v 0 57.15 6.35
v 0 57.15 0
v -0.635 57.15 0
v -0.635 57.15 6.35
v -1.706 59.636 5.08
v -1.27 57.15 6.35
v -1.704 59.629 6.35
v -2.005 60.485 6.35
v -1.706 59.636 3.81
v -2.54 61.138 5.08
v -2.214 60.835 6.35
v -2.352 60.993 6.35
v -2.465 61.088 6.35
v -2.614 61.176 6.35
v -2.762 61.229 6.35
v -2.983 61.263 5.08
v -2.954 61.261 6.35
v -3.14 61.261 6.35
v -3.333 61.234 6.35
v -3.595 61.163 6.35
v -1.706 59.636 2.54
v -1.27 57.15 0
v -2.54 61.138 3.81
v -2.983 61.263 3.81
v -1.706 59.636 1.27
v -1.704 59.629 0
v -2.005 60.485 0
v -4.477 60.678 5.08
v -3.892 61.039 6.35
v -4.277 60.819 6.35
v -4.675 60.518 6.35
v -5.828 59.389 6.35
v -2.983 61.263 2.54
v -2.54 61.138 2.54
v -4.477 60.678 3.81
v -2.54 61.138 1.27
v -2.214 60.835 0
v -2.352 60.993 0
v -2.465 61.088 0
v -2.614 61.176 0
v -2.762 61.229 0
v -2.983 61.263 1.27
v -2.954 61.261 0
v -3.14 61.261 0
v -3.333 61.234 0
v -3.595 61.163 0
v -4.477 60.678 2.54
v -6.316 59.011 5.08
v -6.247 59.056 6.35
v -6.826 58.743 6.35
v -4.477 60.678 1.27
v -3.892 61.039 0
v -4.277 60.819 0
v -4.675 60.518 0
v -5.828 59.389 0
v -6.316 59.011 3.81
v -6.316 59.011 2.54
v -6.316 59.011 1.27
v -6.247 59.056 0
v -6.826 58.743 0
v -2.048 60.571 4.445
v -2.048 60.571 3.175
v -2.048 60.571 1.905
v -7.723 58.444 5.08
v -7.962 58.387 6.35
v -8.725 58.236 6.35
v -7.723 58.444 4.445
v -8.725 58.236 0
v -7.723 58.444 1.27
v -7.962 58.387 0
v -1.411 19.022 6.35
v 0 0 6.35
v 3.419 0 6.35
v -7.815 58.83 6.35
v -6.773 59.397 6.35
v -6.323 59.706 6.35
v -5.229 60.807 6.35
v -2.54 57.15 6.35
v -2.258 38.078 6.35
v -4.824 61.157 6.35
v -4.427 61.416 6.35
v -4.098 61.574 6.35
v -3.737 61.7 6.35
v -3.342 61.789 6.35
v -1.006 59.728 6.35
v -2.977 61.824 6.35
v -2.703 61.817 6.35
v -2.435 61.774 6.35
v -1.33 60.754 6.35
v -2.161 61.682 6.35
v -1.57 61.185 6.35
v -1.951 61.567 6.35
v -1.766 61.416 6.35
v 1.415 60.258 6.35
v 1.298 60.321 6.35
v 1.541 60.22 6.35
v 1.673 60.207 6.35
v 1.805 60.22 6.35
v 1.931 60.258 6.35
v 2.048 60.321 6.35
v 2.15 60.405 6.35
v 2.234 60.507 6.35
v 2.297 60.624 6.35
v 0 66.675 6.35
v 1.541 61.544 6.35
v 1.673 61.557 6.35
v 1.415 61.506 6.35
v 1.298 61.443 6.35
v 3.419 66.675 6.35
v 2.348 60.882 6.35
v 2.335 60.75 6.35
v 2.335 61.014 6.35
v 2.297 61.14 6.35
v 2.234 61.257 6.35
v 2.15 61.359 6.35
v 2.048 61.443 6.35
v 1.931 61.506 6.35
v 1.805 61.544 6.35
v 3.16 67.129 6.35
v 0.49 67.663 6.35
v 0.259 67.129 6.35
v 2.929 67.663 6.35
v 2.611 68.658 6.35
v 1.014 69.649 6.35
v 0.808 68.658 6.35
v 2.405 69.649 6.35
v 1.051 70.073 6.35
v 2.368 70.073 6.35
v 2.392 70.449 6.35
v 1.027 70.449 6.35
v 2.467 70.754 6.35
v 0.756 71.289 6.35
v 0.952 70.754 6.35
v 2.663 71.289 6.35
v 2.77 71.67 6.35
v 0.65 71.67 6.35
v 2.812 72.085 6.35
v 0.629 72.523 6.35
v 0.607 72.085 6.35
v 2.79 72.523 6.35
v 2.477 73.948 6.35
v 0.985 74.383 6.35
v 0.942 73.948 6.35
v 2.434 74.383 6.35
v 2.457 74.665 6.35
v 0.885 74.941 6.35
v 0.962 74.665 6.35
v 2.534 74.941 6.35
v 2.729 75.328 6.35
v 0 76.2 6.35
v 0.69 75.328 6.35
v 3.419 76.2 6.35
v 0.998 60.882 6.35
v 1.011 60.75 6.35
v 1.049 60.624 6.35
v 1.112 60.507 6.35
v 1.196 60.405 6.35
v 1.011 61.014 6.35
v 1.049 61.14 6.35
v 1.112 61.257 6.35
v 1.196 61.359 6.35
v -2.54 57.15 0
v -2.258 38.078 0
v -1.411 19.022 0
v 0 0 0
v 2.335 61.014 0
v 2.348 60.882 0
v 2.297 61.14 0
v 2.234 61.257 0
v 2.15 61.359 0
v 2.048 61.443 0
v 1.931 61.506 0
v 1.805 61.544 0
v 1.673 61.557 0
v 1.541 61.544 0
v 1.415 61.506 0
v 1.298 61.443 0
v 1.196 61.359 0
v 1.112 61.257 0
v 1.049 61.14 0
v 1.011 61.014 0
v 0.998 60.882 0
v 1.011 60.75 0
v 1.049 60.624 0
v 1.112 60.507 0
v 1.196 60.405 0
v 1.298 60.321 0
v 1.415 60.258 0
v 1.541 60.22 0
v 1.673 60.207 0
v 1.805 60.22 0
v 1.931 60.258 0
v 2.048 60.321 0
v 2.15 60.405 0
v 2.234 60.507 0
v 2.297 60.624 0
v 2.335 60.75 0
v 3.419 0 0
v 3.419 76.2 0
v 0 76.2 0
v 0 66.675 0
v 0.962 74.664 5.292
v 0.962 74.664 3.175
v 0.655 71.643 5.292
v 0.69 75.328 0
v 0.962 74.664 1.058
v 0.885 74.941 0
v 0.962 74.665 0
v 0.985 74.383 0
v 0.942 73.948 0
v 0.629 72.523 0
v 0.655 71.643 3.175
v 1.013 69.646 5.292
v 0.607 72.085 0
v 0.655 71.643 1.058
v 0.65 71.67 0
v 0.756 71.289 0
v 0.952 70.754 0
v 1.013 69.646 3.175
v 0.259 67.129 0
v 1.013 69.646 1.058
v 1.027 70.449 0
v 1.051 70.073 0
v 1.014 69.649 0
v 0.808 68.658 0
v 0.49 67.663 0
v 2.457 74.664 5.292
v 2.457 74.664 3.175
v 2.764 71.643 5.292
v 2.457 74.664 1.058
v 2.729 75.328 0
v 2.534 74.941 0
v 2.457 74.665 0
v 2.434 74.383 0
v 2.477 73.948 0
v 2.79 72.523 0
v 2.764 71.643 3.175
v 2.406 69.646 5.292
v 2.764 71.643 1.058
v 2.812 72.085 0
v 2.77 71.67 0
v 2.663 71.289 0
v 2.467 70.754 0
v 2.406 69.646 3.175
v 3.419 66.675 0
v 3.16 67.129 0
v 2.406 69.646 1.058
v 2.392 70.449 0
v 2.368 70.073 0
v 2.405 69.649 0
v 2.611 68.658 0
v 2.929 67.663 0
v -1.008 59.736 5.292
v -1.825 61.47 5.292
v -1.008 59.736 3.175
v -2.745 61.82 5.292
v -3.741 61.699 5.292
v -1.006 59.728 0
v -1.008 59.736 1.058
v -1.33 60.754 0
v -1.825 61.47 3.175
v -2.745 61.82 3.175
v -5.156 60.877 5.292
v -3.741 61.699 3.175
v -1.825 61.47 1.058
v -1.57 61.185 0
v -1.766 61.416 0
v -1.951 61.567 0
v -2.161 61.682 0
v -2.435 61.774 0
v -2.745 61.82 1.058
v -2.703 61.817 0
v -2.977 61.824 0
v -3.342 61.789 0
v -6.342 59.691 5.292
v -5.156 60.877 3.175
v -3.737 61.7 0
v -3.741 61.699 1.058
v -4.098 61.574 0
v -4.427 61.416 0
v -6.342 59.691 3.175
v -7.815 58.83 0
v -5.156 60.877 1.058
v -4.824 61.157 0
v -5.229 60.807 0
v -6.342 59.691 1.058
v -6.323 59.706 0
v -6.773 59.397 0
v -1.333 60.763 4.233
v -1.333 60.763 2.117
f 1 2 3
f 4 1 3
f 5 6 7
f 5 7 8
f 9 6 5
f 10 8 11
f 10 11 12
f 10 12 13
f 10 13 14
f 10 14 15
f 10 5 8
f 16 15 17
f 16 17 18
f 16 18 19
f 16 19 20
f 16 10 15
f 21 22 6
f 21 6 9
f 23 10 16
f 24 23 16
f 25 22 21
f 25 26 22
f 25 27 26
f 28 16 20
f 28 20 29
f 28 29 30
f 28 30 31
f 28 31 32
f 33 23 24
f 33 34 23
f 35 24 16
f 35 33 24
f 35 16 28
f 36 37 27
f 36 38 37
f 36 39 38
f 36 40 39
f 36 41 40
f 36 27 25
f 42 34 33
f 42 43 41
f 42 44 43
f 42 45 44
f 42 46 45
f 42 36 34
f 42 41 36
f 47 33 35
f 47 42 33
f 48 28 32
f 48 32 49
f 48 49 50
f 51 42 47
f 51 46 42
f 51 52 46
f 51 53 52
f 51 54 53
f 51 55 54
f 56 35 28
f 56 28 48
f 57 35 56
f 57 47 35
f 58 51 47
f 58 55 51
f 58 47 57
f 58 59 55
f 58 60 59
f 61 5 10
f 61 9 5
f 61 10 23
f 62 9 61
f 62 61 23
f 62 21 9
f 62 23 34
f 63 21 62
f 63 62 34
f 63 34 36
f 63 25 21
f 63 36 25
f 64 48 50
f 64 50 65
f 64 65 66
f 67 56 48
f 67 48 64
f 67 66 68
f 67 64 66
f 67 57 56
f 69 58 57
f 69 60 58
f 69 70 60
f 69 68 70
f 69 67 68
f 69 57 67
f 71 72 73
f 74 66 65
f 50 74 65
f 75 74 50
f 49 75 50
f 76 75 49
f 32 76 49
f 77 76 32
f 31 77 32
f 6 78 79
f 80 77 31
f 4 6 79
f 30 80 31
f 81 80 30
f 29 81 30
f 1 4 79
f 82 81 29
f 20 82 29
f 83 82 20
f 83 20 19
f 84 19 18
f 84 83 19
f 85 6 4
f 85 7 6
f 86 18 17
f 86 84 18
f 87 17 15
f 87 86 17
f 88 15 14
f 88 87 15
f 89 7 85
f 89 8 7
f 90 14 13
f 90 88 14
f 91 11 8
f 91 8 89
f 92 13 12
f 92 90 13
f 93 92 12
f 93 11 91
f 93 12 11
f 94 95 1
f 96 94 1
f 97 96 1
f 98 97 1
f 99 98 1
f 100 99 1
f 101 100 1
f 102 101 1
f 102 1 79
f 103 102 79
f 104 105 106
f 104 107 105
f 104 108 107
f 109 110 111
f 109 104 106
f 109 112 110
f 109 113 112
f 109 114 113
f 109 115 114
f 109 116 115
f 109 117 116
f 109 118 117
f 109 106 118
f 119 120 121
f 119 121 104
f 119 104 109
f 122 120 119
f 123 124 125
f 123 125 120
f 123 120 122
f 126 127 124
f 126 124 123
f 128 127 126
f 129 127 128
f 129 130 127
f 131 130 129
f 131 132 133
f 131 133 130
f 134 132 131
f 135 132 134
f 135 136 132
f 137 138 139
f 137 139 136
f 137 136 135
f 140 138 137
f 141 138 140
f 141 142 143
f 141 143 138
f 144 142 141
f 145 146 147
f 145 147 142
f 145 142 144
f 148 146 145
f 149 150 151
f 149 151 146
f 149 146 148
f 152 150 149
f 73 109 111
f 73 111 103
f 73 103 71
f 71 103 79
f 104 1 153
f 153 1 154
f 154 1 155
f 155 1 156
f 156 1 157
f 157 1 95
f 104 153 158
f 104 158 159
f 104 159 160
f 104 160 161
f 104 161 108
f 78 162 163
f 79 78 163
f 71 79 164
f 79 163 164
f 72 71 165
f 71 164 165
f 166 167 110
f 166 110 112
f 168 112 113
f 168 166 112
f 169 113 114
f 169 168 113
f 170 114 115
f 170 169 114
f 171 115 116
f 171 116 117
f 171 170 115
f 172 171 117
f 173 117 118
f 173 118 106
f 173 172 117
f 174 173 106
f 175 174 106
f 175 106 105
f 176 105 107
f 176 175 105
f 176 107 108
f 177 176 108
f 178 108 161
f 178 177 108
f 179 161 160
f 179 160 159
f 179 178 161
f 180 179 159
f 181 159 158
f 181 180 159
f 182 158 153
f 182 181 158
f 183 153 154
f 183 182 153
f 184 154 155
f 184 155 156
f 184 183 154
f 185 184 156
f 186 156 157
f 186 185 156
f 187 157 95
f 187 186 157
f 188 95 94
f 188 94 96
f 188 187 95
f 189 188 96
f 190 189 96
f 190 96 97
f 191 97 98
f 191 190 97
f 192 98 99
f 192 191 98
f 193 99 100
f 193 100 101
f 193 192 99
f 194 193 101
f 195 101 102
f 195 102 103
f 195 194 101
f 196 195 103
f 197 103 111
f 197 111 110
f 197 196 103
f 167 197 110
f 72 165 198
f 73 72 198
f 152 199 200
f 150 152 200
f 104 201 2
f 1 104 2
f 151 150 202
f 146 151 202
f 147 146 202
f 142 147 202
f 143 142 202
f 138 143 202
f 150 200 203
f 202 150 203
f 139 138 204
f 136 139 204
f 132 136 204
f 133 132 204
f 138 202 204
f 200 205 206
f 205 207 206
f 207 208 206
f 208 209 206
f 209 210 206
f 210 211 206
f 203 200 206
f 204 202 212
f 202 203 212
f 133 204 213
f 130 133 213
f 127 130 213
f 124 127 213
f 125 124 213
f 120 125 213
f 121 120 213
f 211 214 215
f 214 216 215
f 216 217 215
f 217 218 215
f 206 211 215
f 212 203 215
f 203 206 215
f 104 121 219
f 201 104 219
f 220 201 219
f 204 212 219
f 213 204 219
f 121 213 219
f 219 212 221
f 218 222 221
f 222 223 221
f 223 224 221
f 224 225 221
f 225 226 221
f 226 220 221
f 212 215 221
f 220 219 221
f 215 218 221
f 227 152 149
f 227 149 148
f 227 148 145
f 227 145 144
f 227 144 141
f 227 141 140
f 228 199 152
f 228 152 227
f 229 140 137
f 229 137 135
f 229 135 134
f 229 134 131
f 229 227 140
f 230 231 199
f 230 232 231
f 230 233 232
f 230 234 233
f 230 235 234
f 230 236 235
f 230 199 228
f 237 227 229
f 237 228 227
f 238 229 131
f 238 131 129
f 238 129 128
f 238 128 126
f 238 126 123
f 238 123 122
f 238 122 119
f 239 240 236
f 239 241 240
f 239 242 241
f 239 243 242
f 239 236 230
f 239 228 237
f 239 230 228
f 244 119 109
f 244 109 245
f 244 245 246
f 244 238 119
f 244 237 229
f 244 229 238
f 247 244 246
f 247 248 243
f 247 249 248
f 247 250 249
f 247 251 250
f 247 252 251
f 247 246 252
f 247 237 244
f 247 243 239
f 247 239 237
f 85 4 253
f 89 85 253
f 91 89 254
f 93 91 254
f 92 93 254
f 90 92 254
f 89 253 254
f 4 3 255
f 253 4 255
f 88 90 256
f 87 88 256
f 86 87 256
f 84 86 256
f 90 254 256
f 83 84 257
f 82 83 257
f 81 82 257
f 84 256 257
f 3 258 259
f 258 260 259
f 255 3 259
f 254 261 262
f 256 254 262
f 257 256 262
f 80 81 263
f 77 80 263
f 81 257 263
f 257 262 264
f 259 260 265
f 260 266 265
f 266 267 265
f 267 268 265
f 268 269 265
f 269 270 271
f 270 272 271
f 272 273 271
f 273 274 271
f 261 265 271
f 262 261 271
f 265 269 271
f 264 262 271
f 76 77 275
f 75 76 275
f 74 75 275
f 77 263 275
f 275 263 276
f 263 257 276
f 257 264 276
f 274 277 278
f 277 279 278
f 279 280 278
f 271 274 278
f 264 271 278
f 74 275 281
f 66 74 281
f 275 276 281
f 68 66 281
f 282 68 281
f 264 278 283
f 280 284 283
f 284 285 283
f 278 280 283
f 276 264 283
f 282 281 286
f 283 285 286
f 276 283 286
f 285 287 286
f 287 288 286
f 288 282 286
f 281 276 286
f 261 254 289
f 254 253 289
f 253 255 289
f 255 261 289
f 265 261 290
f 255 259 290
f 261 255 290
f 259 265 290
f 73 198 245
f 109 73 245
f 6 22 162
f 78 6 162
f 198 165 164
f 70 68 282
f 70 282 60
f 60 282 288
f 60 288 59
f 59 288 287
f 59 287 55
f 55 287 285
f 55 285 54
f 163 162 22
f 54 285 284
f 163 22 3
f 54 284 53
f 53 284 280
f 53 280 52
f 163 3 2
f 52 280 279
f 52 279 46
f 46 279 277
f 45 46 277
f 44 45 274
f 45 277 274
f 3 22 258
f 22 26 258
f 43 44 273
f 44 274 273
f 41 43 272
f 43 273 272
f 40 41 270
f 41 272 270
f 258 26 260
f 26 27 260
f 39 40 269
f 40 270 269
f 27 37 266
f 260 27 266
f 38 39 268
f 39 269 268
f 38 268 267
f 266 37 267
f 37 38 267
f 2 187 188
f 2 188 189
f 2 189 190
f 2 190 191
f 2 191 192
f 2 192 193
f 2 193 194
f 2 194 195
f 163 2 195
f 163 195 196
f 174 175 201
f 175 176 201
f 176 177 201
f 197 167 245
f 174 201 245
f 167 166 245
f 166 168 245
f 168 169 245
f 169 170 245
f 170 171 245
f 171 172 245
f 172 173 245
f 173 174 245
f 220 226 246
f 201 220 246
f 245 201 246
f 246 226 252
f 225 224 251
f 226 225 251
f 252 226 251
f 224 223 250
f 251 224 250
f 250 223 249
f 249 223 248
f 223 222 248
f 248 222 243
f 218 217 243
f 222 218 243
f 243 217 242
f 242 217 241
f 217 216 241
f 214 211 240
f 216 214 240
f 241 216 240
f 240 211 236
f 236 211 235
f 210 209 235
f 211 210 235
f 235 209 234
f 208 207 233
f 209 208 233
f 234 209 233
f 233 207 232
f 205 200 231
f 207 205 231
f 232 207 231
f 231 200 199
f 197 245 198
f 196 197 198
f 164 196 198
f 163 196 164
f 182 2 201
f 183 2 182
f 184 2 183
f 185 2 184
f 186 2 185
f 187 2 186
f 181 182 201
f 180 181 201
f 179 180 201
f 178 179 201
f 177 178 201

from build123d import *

# Parameters (mm, degrees)
F0_R     = 0.6750562138
F1_DEPTH = 6.35


with BuildPart() as f1:
    # F0 (on Top) → F1 (new body)
    with BuildSketch(Plane.XY):
        with BuildLine():
            Line((0, 57.15), (0, 0))
            Line((0, 0), (3.419047772, 0))
            Line((3.419047772, 0), (3.419047772, 66.675))
            add(Edge.make_bspline(
                [(3.419047772, 76.2), (3.0037245486, 75.7300271424), (2.1227516333, 74.7338041598), (2.7931024976, 72.9988795595), (2.8678197081, 71.6540162547), (2.3885468254, 70.6950296341), (2.2938936407, 69.6351160517), (2.9086507893, 67.4280476767), (3.419047772, 66.675)],
                knots=[0, 0, 0, 0, 0.1770581904, 0.3490122219, 0.5008356976, 0.630484, 0.7669570949, 1, 1, 1, 1], degree=3))
            Line((3.419047772, 76.2), (1.709523886, 76.2))
            Line((1.709523886, 76.2), (0, 76.2))
            add(Edge.make_bspline(
                [(0, 76.2), (0.4153232234, 75.7300271424), (1.2962961387, 74.7338041598), (0.6259452744, 72.9988795595), (0.5512280639, 71.6540162547), (1.0305009466, 70.6950296341), (1.1251541313, 69.6351160517), (0.5103969827, 67.4280476767), (0, 66.675)],
                knots=[0, 0, 0, 0, 0.1770581904, 0.3490122219, 0.5008356976, 0.630484, 0.7669570949, 1, 1, 1, 1], degree=3))
            Line((0, 66.675), (0, 57.15))
        make_face()
        with Locations((1.6730700154, 60.8820840716)):
            Circle(F0_R, mode=Mode.SUBTRACT)
        with BuildLine():
            ThreePointArc((-2.54, 57.15), (-1.9046867291, 28.5467917009), (0, 0))
            Line((0, 0), (0, 57.15))
            Line((0, 57.15), (-0.635, 57.15))
            Line((-0.635, 57.15), (-1.27, 57.15))
            Line((-1.27, 57.15), (-2.54, 57.15))
        make_face()
        with BuildLine():
            Line((-1.27, 57.15), (-0.635, 57.15))
            add(Edge.make_bspline(
                [(-0.635, 57.15), (-0.8344189409, 58.9685787976), (-1.1646933693, 61.9804796245), (-3.8316234786, 61.8411399026), (-5.2090319123, 60.962088431), (-6.2474716265, 59.5864787743), (-7.6780619172, 58.9591241724), (-8.3874736715, 58.4690696755), (-8.7246154109, 58.2361426137)],
                knots=[0, 0, 0, 0, 0.2507983374, 0.4153681549, 0.5668719339, 0.7203130141, 0.8670255908, 0.9999167765, 0.9999167765, 0.9999167765, 0.9999167765], degree=3))
            add(Edge.make_bspline(
                [(-1.27, 57.15), (-1.5163936563, 58.9164716506), (-1.9327165615, 61.901218176), (-4.7450355941, 60.7938230612), (-6.0475443647, 58.8080385101), (-8.0794495379, 58.3521382776), (-8.5982206433, 58.25792169), (-8.7246154109, 58.2361426137)],
                knots=[0, 0, 0, 0, 0.28126173, 0.4752382927, 0.6918546924, 0.8897828277, 0.9638641037, 0.9638641037, 0.9638641037, 0.9638641037], degree=3))
        make_face()
    extrude(amount=F1_DEPTH)


solid = f1.part
